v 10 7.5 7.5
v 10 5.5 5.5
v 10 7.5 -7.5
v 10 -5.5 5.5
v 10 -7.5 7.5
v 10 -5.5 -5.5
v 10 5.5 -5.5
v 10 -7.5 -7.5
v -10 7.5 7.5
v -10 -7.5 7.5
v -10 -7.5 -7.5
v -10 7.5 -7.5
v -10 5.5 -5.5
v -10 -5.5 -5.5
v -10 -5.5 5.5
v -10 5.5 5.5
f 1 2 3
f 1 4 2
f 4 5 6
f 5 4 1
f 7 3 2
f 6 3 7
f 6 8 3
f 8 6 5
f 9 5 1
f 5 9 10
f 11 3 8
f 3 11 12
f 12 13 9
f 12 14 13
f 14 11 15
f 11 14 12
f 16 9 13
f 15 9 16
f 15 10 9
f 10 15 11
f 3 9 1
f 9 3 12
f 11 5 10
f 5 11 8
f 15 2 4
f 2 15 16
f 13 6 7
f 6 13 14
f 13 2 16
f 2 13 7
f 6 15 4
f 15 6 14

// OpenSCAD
//PCB vice tolerance test V1.0
//
//

rodWidth = 11; // cut out for rod


difference()
{
    cube([20, 15, 15], center = true);
    cube([20, rodWidth, rodWidth], center = true);
}
